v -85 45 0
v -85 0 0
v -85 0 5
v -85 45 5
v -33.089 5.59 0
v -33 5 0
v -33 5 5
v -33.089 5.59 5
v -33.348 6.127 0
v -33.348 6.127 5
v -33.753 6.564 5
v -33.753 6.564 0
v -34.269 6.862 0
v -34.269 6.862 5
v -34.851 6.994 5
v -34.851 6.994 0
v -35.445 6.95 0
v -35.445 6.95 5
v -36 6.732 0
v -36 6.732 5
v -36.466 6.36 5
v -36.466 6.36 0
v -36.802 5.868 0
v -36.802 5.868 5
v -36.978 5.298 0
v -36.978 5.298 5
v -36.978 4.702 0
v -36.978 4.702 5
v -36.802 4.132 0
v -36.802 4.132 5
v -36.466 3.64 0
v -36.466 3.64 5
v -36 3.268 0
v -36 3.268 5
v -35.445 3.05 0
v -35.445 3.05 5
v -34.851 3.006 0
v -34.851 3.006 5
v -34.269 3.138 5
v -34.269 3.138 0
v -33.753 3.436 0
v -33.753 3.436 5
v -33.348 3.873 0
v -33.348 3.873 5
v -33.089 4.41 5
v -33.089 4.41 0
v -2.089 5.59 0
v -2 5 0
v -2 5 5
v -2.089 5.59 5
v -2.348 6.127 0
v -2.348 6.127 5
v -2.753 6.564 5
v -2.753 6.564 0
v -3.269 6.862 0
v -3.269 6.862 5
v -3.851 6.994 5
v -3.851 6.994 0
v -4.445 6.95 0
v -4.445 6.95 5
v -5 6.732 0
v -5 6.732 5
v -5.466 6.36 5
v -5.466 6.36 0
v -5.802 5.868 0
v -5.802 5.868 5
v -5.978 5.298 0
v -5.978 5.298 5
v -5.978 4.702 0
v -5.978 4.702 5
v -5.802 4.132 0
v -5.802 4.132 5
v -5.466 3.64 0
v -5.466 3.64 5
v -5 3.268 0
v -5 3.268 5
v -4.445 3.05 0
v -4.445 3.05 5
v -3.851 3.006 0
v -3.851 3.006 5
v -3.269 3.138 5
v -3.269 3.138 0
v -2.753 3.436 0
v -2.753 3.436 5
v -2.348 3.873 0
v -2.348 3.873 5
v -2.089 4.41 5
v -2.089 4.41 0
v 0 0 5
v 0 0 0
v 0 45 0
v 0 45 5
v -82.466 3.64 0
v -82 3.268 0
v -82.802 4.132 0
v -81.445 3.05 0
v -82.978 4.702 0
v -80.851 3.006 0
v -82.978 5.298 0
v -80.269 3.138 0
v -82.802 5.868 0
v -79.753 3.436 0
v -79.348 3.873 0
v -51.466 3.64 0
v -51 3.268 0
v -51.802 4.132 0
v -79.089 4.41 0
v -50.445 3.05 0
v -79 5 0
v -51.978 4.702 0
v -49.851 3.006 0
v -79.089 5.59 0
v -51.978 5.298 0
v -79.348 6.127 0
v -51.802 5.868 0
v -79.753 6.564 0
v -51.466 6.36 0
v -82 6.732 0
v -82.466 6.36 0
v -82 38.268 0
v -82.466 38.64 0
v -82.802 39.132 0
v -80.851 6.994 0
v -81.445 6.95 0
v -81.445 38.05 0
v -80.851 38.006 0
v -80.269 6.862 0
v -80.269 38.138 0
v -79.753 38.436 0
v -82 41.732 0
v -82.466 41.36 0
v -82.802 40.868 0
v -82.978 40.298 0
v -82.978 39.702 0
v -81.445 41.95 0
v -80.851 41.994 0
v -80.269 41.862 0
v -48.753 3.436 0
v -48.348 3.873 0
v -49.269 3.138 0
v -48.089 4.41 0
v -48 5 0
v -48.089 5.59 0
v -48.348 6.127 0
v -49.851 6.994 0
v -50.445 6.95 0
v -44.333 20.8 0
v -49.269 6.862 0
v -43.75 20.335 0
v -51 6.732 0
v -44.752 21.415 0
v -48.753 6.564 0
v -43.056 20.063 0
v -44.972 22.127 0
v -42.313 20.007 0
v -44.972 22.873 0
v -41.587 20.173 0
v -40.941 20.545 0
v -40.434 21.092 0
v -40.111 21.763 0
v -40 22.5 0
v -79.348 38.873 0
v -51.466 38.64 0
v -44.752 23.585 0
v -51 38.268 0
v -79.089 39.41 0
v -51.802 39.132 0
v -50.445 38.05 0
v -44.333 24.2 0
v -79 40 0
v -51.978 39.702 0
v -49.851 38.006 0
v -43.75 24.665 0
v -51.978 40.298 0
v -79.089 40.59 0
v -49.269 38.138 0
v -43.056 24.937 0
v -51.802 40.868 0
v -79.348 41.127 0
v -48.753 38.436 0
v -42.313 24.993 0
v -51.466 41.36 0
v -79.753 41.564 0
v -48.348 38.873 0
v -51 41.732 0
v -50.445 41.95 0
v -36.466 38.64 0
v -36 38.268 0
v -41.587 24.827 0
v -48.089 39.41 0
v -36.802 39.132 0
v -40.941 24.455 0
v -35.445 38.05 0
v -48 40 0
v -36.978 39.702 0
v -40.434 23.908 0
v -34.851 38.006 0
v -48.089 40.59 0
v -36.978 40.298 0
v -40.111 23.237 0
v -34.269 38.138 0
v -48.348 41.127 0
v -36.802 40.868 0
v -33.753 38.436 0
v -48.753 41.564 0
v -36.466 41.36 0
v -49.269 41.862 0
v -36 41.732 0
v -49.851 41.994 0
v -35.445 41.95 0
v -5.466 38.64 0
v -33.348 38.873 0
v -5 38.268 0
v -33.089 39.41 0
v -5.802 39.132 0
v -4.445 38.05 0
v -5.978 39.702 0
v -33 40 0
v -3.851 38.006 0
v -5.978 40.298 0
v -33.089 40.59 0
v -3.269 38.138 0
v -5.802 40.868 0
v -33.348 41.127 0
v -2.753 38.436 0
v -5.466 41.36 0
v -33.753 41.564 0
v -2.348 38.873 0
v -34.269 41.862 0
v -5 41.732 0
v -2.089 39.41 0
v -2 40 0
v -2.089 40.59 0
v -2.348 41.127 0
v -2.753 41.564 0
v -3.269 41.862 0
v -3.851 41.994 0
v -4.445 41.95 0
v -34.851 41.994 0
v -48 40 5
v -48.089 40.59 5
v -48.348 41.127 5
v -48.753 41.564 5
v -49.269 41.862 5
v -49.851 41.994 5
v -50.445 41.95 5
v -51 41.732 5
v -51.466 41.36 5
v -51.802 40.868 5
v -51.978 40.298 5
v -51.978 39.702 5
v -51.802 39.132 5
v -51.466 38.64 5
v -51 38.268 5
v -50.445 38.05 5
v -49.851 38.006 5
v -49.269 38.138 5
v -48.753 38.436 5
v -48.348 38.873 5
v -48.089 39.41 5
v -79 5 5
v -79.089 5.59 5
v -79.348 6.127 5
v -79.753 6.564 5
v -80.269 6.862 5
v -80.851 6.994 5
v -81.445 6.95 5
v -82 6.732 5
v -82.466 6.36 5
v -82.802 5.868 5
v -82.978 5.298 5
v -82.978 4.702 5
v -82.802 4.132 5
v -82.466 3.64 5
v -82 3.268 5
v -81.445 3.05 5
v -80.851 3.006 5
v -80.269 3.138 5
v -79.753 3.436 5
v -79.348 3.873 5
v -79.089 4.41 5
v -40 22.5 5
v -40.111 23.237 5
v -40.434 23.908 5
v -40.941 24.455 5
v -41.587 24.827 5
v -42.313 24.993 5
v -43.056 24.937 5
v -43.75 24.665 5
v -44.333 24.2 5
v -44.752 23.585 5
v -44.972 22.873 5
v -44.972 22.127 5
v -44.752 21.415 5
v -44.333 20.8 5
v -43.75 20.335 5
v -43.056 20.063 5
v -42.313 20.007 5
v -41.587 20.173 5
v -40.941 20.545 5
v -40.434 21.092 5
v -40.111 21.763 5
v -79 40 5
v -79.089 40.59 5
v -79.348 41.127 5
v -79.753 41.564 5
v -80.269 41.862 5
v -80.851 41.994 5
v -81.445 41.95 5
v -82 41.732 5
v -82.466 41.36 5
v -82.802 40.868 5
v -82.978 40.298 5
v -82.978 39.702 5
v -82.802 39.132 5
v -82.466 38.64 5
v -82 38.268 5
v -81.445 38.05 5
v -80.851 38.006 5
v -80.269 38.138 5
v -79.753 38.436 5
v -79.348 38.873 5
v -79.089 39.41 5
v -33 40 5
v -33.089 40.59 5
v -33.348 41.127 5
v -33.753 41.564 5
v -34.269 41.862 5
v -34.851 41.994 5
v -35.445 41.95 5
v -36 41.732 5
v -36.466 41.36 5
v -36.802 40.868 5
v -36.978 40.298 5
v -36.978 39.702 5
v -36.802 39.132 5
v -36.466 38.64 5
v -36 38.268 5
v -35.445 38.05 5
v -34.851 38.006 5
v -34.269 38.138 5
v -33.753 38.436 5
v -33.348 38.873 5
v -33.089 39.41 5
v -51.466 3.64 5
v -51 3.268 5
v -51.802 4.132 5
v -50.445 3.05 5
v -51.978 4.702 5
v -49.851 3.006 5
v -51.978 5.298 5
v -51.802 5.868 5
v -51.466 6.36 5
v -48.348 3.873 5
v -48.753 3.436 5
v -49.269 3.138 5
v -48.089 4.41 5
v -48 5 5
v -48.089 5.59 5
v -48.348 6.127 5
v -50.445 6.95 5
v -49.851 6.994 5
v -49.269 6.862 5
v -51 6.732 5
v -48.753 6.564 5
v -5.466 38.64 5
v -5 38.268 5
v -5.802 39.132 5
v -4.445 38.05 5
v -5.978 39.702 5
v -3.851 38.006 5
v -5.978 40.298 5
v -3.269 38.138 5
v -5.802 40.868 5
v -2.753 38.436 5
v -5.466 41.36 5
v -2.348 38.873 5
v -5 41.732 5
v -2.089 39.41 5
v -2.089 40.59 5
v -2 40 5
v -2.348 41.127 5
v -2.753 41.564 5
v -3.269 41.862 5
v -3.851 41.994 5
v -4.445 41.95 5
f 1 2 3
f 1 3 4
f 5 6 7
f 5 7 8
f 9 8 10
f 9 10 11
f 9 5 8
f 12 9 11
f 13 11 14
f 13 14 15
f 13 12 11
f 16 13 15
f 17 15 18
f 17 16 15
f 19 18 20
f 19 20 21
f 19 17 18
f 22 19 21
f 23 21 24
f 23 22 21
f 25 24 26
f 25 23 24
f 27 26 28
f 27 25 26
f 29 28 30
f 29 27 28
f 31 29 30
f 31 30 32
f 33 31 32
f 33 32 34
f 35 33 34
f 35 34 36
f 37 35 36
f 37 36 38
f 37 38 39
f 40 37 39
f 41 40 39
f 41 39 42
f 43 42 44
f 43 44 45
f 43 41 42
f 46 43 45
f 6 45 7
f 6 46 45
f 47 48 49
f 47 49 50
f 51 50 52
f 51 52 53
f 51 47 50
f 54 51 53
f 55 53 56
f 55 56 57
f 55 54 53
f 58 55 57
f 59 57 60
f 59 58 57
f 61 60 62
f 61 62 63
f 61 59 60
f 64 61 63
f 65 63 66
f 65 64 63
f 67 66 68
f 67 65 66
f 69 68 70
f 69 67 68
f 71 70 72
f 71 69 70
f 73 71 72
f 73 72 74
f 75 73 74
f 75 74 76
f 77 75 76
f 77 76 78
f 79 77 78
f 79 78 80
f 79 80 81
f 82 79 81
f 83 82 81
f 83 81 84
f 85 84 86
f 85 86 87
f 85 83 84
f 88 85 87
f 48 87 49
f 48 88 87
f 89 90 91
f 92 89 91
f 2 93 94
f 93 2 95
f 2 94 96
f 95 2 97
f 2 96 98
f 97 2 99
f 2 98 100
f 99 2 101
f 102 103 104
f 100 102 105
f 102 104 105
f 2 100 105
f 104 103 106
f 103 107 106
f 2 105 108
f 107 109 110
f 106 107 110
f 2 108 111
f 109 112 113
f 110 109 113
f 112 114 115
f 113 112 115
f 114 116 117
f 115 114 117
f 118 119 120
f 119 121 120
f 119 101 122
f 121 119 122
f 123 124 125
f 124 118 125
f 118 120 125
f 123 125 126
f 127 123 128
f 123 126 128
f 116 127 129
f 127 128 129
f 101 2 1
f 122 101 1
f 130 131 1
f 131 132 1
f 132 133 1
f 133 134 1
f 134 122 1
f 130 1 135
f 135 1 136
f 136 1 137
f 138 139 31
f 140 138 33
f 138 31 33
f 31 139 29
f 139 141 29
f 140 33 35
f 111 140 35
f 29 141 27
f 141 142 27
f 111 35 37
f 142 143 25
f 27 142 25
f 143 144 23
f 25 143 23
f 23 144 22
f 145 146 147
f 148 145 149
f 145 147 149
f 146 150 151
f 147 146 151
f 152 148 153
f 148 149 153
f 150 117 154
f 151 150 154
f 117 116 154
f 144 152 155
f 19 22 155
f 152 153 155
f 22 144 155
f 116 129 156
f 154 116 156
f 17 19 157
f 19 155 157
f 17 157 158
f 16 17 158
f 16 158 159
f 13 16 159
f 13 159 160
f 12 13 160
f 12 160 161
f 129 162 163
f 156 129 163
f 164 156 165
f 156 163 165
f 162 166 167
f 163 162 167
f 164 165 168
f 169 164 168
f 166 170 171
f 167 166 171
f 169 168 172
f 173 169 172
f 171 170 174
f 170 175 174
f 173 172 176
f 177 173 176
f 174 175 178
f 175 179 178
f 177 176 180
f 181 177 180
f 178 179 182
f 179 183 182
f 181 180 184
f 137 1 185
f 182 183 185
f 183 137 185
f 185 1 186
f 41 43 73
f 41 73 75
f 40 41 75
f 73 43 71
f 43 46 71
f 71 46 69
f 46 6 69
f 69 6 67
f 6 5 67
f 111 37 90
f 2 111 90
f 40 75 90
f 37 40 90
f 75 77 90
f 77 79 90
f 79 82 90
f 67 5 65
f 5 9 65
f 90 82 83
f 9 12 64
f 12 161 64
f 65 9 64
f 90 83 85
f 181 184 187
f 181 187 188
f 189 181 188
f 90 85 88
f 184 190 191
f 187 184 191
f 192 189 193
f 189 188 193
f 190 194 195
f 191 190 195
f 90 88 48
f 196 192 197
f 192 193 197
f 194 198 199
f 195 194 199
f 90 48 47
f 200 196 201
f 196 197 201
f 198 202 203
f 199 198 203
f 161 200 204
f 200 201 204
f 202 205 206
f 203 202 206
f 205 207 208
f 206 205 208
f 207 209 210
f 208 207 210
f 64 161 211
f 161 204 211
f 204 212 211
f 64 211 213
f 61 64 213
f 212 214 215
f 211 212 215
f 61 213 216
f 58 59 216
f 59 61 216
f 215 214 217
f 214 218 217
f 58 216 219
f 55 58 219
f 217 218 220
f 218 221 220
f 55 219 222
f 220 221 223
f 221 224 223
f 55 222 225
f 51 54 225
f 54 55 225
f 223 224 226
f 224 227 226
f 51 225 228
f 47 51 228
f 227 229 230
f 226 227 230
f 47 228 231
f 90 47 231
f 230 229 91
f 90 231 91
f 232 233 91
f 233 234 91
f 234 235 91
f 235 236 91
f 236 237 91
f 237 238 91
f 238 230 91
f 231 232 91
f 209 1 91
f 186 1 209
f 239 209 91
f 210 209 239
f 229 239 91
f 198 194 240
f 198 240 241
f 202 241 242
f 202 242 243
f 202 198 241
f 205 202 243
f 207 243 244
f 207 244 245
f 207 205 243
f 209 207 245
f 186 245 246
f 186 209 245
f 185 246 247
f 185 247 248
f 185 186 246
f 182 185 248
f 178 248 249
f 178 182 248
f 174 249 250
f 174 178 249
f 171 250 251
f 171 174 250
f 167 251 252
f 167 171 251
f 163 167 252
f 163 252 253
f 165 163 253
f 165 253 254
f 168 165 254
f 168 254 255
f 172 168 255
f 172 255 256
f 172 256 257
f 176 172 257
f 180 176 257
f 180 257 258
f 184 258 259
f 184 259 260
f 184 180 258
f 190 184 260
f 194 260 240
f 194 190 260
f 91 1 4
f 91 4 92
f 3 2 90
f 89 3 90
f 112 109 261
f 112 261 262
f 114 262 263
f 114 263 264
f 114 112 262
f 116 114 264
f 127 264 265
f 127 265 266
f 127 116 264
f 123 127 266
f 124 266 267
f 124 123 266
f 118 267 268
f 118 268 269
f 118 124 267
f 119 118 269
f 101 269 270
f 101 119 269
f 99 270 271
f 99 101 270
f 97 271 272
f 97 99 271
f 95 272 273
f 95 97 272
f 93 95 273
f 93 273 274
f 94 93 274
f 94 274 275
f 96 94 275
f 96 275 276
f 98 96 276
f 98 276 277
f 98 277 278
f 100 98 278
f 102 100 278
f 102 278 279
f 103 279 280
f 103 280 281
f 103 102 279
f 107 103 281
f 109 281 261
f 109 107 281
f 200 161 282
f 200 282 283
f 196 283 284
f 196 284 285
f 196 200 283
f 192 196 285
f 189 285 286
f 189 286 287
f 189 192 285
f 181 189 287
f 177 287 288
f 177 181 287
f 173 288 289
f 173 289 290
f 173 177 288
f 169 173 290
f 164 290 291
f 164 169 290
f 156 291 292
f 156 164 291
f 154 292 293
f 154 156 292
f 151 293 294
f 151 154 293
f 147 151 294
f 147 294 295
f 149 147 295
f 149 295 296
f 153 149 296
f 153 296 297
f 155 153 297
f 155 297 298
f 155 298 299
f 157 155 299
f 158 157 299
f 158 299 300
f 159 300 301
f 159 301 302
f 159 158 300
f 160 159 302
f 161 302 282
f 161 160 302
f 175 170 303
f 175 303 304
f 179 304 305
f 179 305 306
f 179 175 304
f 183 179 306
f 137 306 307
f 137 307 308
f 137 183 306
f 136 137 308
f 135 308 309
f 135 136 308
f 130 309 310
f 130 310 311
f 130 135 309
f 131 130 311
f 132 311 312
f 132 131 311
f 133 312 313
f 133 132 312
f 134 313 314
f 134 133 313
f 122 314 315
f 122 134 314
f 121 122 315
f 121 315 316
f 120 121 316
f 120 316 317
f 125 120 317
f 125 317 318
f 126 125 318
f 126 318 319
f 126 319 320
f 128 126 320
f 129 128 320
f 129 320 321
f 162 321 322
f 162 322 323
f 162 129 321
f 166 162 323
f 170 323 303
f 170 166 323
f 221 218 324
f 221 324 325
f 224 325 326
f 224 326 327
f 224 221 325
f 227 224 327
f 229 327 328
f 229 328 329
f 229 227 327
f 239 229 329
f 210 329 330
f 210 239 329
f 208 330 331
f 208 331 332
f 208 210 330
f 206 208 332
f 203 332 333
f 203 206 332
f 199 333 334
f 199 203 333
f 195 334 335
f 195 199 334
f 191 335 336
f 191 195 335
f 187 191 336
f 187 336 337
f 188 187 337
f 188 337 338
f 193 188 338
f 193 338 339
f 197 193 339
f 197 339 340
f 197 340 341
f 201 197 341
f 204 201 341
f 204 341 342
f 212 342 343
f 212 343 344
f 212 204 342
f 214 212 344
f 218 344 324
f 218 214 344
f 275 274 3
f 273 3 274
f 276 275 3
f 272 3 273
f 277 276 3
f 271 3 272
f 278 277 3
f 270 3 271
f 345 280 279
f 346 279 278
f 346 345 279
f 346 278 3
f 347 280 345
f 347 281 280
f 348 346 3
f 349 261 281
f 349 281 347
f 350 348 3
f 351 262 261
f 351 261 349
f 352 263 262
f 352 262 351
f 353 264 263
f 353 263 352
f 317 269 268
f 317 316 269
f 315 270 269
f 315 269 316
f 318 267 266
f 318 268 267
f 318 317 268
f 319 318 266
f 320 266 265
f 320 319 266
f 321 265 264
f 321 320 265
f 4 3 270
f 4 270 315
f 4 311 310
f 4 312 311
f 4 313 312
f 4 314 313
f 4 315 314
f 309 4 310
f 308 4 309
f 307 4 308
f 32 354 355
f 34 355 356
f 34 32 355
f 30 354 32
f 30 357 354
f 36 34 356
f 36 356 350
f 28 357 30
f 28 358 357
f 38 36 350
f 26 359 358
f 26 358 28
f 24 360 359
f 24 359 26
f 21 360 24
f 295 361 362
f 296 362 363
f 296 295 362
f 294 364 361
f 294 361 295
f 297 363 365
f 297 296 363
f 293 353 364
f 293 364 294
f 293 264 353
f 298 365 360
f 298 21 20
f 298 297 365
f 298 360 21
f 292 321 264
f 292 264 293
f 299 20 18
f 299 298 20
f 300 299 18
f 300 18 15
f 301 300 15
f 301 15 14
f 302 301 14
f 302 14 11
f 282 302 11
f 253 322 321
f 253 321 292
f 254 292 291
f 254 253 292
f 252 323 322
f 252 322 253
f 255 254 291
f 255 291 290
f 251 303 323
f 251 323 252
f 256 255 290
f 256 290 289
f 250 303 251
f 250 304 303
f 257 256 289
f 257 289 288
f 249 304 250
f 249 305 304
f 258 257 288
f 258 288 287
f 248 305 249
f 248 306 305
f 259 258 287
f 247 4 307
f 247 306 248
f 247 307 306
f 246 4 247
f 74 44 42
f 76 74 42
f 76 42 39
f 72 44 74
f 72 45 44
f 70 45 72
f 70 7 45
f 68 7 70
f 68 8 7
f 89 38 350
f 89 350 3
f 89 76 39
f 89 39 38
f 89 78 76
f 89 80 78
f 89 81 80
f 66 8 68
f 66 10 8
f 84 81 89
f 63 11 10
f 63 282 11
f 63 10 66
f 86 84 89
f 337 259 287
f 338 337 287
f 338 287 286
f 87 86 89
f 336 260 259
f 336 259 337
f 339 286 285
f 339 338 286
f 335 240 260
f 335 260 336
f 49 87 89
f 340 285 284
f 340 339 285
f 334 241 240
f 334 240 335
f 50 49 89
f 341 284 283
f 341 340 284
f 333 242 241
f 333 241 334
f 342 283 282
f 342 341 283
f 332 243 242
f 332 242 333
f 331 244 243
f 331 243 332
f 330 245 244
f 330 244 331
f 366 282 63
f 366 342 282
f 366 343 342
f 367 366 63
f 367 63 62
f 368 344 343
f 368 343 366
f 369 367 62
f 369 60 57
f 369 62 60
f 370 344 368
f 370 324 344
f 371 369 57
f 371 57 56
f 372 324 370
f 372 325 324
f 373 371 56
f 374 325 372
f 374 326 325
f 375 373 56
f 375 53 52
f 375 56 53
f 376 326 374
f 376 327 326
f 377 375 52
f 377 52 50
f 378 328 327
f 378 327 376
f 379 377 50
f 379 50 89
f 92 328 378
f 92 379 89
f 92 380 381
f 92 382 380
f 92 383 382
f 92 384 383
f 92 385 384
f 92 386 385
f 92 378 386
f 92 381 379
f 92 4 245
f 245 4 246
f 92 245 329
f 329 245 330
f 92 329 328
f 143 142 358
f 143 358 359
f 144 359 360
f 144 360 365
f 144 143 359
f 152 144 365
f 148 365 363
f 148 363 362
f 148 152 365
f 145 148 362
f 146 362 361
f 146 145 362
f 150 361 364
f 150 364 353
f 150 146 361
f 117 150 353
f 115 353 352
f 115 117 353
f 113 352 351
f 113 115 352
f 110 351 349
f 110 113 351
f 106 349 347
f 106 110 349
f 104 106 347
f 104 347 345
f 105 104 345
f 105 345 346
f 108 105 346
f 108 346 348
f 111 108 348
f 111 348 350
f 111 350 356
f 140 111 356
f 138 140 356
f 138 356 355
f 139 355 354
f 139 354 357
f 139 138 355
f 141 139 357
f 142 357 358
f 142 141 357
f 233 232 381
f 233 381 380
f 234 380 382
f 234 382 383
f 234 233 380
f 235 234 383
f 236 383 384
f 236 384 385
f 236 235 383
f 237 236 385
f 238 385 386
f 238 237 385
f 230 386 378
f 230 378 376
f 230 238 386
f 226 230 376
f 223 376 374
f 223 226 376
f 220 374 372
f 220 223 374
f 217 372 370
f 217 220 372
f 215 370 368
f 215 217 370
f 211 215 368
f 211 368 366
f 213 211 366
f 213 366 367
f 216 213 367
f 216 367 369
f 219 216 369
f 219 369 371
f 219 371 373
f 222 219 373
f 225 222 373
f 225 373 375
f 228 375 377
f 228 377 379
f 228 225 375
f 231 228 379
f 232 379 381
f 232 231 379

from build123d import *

# Parameters (mm, degrees)
SKETCH1_W                = 85
SKETCH1_H                = 45
BOSS_EXTRUDE1_DEPTH      = 5
CUT_EXTRUDE1_OUTLINE_R   = 2
CUT_EXTRUDE1_OUTLINE_R_2 = 2.5
CUT_EXTRUDE1_DEPTH       = 5


# Read off the part's stored shape, not the designer's step: Cut-Extrude1
with BuildPart() as part:
    # Sketch1 → Boss-Extrude1 (new body)
    with BuildSketch(Plane.XY):
        with Locations((-42.5, 22.5)):
            Rectangle(SKETCH1_W, SKETCH1_H)
    extrude(amount=BOSS_EXTRUDE1_DEPTH)

    # Cut-Extrude1 outline → Cut-Extrude1 (cut)
    with BuildSketch(Plane.XY):
        with Locations((-81, 40)):
            Circle(CUT_EXTRUDE1_OUTLINE_R)
        with Locations((-35, 5)):
            Circle(CUT_EXTRUDE1_OUTLINE_R)
        with Locations((-35, 40)):
            Circle(CUT_EXTRUDE1_OUTLINE_R)
        with Locations((-4, 40)):
            Circle(CUT_EXTRUDE1_OUTLINE_R)
        with Locations((-42.5, 22.5)):
            Circle(CUT_EXTRUDE1_OUTLINE_R_2)
        with Locations((-81, 5)):
            Circle(CUT_EXTRUDE1_OUTLINE_R)
        with Locations((-50, 5)):
            Circle(CUT_EXTRUDE1_OUTLINE_R)
        with Locations((-50, 40)):
            Circle(CUT_EXTRUDE1_OUTLINE_R)
        with Locations((-4, 5)):
            Circle(CUT_EXTRUDE1_OUTLINE_R)
    extrude(amount=CUT_EXTRUDE1_DEPTH, mode=Mode.SUBTRACT)


solid = part.part
